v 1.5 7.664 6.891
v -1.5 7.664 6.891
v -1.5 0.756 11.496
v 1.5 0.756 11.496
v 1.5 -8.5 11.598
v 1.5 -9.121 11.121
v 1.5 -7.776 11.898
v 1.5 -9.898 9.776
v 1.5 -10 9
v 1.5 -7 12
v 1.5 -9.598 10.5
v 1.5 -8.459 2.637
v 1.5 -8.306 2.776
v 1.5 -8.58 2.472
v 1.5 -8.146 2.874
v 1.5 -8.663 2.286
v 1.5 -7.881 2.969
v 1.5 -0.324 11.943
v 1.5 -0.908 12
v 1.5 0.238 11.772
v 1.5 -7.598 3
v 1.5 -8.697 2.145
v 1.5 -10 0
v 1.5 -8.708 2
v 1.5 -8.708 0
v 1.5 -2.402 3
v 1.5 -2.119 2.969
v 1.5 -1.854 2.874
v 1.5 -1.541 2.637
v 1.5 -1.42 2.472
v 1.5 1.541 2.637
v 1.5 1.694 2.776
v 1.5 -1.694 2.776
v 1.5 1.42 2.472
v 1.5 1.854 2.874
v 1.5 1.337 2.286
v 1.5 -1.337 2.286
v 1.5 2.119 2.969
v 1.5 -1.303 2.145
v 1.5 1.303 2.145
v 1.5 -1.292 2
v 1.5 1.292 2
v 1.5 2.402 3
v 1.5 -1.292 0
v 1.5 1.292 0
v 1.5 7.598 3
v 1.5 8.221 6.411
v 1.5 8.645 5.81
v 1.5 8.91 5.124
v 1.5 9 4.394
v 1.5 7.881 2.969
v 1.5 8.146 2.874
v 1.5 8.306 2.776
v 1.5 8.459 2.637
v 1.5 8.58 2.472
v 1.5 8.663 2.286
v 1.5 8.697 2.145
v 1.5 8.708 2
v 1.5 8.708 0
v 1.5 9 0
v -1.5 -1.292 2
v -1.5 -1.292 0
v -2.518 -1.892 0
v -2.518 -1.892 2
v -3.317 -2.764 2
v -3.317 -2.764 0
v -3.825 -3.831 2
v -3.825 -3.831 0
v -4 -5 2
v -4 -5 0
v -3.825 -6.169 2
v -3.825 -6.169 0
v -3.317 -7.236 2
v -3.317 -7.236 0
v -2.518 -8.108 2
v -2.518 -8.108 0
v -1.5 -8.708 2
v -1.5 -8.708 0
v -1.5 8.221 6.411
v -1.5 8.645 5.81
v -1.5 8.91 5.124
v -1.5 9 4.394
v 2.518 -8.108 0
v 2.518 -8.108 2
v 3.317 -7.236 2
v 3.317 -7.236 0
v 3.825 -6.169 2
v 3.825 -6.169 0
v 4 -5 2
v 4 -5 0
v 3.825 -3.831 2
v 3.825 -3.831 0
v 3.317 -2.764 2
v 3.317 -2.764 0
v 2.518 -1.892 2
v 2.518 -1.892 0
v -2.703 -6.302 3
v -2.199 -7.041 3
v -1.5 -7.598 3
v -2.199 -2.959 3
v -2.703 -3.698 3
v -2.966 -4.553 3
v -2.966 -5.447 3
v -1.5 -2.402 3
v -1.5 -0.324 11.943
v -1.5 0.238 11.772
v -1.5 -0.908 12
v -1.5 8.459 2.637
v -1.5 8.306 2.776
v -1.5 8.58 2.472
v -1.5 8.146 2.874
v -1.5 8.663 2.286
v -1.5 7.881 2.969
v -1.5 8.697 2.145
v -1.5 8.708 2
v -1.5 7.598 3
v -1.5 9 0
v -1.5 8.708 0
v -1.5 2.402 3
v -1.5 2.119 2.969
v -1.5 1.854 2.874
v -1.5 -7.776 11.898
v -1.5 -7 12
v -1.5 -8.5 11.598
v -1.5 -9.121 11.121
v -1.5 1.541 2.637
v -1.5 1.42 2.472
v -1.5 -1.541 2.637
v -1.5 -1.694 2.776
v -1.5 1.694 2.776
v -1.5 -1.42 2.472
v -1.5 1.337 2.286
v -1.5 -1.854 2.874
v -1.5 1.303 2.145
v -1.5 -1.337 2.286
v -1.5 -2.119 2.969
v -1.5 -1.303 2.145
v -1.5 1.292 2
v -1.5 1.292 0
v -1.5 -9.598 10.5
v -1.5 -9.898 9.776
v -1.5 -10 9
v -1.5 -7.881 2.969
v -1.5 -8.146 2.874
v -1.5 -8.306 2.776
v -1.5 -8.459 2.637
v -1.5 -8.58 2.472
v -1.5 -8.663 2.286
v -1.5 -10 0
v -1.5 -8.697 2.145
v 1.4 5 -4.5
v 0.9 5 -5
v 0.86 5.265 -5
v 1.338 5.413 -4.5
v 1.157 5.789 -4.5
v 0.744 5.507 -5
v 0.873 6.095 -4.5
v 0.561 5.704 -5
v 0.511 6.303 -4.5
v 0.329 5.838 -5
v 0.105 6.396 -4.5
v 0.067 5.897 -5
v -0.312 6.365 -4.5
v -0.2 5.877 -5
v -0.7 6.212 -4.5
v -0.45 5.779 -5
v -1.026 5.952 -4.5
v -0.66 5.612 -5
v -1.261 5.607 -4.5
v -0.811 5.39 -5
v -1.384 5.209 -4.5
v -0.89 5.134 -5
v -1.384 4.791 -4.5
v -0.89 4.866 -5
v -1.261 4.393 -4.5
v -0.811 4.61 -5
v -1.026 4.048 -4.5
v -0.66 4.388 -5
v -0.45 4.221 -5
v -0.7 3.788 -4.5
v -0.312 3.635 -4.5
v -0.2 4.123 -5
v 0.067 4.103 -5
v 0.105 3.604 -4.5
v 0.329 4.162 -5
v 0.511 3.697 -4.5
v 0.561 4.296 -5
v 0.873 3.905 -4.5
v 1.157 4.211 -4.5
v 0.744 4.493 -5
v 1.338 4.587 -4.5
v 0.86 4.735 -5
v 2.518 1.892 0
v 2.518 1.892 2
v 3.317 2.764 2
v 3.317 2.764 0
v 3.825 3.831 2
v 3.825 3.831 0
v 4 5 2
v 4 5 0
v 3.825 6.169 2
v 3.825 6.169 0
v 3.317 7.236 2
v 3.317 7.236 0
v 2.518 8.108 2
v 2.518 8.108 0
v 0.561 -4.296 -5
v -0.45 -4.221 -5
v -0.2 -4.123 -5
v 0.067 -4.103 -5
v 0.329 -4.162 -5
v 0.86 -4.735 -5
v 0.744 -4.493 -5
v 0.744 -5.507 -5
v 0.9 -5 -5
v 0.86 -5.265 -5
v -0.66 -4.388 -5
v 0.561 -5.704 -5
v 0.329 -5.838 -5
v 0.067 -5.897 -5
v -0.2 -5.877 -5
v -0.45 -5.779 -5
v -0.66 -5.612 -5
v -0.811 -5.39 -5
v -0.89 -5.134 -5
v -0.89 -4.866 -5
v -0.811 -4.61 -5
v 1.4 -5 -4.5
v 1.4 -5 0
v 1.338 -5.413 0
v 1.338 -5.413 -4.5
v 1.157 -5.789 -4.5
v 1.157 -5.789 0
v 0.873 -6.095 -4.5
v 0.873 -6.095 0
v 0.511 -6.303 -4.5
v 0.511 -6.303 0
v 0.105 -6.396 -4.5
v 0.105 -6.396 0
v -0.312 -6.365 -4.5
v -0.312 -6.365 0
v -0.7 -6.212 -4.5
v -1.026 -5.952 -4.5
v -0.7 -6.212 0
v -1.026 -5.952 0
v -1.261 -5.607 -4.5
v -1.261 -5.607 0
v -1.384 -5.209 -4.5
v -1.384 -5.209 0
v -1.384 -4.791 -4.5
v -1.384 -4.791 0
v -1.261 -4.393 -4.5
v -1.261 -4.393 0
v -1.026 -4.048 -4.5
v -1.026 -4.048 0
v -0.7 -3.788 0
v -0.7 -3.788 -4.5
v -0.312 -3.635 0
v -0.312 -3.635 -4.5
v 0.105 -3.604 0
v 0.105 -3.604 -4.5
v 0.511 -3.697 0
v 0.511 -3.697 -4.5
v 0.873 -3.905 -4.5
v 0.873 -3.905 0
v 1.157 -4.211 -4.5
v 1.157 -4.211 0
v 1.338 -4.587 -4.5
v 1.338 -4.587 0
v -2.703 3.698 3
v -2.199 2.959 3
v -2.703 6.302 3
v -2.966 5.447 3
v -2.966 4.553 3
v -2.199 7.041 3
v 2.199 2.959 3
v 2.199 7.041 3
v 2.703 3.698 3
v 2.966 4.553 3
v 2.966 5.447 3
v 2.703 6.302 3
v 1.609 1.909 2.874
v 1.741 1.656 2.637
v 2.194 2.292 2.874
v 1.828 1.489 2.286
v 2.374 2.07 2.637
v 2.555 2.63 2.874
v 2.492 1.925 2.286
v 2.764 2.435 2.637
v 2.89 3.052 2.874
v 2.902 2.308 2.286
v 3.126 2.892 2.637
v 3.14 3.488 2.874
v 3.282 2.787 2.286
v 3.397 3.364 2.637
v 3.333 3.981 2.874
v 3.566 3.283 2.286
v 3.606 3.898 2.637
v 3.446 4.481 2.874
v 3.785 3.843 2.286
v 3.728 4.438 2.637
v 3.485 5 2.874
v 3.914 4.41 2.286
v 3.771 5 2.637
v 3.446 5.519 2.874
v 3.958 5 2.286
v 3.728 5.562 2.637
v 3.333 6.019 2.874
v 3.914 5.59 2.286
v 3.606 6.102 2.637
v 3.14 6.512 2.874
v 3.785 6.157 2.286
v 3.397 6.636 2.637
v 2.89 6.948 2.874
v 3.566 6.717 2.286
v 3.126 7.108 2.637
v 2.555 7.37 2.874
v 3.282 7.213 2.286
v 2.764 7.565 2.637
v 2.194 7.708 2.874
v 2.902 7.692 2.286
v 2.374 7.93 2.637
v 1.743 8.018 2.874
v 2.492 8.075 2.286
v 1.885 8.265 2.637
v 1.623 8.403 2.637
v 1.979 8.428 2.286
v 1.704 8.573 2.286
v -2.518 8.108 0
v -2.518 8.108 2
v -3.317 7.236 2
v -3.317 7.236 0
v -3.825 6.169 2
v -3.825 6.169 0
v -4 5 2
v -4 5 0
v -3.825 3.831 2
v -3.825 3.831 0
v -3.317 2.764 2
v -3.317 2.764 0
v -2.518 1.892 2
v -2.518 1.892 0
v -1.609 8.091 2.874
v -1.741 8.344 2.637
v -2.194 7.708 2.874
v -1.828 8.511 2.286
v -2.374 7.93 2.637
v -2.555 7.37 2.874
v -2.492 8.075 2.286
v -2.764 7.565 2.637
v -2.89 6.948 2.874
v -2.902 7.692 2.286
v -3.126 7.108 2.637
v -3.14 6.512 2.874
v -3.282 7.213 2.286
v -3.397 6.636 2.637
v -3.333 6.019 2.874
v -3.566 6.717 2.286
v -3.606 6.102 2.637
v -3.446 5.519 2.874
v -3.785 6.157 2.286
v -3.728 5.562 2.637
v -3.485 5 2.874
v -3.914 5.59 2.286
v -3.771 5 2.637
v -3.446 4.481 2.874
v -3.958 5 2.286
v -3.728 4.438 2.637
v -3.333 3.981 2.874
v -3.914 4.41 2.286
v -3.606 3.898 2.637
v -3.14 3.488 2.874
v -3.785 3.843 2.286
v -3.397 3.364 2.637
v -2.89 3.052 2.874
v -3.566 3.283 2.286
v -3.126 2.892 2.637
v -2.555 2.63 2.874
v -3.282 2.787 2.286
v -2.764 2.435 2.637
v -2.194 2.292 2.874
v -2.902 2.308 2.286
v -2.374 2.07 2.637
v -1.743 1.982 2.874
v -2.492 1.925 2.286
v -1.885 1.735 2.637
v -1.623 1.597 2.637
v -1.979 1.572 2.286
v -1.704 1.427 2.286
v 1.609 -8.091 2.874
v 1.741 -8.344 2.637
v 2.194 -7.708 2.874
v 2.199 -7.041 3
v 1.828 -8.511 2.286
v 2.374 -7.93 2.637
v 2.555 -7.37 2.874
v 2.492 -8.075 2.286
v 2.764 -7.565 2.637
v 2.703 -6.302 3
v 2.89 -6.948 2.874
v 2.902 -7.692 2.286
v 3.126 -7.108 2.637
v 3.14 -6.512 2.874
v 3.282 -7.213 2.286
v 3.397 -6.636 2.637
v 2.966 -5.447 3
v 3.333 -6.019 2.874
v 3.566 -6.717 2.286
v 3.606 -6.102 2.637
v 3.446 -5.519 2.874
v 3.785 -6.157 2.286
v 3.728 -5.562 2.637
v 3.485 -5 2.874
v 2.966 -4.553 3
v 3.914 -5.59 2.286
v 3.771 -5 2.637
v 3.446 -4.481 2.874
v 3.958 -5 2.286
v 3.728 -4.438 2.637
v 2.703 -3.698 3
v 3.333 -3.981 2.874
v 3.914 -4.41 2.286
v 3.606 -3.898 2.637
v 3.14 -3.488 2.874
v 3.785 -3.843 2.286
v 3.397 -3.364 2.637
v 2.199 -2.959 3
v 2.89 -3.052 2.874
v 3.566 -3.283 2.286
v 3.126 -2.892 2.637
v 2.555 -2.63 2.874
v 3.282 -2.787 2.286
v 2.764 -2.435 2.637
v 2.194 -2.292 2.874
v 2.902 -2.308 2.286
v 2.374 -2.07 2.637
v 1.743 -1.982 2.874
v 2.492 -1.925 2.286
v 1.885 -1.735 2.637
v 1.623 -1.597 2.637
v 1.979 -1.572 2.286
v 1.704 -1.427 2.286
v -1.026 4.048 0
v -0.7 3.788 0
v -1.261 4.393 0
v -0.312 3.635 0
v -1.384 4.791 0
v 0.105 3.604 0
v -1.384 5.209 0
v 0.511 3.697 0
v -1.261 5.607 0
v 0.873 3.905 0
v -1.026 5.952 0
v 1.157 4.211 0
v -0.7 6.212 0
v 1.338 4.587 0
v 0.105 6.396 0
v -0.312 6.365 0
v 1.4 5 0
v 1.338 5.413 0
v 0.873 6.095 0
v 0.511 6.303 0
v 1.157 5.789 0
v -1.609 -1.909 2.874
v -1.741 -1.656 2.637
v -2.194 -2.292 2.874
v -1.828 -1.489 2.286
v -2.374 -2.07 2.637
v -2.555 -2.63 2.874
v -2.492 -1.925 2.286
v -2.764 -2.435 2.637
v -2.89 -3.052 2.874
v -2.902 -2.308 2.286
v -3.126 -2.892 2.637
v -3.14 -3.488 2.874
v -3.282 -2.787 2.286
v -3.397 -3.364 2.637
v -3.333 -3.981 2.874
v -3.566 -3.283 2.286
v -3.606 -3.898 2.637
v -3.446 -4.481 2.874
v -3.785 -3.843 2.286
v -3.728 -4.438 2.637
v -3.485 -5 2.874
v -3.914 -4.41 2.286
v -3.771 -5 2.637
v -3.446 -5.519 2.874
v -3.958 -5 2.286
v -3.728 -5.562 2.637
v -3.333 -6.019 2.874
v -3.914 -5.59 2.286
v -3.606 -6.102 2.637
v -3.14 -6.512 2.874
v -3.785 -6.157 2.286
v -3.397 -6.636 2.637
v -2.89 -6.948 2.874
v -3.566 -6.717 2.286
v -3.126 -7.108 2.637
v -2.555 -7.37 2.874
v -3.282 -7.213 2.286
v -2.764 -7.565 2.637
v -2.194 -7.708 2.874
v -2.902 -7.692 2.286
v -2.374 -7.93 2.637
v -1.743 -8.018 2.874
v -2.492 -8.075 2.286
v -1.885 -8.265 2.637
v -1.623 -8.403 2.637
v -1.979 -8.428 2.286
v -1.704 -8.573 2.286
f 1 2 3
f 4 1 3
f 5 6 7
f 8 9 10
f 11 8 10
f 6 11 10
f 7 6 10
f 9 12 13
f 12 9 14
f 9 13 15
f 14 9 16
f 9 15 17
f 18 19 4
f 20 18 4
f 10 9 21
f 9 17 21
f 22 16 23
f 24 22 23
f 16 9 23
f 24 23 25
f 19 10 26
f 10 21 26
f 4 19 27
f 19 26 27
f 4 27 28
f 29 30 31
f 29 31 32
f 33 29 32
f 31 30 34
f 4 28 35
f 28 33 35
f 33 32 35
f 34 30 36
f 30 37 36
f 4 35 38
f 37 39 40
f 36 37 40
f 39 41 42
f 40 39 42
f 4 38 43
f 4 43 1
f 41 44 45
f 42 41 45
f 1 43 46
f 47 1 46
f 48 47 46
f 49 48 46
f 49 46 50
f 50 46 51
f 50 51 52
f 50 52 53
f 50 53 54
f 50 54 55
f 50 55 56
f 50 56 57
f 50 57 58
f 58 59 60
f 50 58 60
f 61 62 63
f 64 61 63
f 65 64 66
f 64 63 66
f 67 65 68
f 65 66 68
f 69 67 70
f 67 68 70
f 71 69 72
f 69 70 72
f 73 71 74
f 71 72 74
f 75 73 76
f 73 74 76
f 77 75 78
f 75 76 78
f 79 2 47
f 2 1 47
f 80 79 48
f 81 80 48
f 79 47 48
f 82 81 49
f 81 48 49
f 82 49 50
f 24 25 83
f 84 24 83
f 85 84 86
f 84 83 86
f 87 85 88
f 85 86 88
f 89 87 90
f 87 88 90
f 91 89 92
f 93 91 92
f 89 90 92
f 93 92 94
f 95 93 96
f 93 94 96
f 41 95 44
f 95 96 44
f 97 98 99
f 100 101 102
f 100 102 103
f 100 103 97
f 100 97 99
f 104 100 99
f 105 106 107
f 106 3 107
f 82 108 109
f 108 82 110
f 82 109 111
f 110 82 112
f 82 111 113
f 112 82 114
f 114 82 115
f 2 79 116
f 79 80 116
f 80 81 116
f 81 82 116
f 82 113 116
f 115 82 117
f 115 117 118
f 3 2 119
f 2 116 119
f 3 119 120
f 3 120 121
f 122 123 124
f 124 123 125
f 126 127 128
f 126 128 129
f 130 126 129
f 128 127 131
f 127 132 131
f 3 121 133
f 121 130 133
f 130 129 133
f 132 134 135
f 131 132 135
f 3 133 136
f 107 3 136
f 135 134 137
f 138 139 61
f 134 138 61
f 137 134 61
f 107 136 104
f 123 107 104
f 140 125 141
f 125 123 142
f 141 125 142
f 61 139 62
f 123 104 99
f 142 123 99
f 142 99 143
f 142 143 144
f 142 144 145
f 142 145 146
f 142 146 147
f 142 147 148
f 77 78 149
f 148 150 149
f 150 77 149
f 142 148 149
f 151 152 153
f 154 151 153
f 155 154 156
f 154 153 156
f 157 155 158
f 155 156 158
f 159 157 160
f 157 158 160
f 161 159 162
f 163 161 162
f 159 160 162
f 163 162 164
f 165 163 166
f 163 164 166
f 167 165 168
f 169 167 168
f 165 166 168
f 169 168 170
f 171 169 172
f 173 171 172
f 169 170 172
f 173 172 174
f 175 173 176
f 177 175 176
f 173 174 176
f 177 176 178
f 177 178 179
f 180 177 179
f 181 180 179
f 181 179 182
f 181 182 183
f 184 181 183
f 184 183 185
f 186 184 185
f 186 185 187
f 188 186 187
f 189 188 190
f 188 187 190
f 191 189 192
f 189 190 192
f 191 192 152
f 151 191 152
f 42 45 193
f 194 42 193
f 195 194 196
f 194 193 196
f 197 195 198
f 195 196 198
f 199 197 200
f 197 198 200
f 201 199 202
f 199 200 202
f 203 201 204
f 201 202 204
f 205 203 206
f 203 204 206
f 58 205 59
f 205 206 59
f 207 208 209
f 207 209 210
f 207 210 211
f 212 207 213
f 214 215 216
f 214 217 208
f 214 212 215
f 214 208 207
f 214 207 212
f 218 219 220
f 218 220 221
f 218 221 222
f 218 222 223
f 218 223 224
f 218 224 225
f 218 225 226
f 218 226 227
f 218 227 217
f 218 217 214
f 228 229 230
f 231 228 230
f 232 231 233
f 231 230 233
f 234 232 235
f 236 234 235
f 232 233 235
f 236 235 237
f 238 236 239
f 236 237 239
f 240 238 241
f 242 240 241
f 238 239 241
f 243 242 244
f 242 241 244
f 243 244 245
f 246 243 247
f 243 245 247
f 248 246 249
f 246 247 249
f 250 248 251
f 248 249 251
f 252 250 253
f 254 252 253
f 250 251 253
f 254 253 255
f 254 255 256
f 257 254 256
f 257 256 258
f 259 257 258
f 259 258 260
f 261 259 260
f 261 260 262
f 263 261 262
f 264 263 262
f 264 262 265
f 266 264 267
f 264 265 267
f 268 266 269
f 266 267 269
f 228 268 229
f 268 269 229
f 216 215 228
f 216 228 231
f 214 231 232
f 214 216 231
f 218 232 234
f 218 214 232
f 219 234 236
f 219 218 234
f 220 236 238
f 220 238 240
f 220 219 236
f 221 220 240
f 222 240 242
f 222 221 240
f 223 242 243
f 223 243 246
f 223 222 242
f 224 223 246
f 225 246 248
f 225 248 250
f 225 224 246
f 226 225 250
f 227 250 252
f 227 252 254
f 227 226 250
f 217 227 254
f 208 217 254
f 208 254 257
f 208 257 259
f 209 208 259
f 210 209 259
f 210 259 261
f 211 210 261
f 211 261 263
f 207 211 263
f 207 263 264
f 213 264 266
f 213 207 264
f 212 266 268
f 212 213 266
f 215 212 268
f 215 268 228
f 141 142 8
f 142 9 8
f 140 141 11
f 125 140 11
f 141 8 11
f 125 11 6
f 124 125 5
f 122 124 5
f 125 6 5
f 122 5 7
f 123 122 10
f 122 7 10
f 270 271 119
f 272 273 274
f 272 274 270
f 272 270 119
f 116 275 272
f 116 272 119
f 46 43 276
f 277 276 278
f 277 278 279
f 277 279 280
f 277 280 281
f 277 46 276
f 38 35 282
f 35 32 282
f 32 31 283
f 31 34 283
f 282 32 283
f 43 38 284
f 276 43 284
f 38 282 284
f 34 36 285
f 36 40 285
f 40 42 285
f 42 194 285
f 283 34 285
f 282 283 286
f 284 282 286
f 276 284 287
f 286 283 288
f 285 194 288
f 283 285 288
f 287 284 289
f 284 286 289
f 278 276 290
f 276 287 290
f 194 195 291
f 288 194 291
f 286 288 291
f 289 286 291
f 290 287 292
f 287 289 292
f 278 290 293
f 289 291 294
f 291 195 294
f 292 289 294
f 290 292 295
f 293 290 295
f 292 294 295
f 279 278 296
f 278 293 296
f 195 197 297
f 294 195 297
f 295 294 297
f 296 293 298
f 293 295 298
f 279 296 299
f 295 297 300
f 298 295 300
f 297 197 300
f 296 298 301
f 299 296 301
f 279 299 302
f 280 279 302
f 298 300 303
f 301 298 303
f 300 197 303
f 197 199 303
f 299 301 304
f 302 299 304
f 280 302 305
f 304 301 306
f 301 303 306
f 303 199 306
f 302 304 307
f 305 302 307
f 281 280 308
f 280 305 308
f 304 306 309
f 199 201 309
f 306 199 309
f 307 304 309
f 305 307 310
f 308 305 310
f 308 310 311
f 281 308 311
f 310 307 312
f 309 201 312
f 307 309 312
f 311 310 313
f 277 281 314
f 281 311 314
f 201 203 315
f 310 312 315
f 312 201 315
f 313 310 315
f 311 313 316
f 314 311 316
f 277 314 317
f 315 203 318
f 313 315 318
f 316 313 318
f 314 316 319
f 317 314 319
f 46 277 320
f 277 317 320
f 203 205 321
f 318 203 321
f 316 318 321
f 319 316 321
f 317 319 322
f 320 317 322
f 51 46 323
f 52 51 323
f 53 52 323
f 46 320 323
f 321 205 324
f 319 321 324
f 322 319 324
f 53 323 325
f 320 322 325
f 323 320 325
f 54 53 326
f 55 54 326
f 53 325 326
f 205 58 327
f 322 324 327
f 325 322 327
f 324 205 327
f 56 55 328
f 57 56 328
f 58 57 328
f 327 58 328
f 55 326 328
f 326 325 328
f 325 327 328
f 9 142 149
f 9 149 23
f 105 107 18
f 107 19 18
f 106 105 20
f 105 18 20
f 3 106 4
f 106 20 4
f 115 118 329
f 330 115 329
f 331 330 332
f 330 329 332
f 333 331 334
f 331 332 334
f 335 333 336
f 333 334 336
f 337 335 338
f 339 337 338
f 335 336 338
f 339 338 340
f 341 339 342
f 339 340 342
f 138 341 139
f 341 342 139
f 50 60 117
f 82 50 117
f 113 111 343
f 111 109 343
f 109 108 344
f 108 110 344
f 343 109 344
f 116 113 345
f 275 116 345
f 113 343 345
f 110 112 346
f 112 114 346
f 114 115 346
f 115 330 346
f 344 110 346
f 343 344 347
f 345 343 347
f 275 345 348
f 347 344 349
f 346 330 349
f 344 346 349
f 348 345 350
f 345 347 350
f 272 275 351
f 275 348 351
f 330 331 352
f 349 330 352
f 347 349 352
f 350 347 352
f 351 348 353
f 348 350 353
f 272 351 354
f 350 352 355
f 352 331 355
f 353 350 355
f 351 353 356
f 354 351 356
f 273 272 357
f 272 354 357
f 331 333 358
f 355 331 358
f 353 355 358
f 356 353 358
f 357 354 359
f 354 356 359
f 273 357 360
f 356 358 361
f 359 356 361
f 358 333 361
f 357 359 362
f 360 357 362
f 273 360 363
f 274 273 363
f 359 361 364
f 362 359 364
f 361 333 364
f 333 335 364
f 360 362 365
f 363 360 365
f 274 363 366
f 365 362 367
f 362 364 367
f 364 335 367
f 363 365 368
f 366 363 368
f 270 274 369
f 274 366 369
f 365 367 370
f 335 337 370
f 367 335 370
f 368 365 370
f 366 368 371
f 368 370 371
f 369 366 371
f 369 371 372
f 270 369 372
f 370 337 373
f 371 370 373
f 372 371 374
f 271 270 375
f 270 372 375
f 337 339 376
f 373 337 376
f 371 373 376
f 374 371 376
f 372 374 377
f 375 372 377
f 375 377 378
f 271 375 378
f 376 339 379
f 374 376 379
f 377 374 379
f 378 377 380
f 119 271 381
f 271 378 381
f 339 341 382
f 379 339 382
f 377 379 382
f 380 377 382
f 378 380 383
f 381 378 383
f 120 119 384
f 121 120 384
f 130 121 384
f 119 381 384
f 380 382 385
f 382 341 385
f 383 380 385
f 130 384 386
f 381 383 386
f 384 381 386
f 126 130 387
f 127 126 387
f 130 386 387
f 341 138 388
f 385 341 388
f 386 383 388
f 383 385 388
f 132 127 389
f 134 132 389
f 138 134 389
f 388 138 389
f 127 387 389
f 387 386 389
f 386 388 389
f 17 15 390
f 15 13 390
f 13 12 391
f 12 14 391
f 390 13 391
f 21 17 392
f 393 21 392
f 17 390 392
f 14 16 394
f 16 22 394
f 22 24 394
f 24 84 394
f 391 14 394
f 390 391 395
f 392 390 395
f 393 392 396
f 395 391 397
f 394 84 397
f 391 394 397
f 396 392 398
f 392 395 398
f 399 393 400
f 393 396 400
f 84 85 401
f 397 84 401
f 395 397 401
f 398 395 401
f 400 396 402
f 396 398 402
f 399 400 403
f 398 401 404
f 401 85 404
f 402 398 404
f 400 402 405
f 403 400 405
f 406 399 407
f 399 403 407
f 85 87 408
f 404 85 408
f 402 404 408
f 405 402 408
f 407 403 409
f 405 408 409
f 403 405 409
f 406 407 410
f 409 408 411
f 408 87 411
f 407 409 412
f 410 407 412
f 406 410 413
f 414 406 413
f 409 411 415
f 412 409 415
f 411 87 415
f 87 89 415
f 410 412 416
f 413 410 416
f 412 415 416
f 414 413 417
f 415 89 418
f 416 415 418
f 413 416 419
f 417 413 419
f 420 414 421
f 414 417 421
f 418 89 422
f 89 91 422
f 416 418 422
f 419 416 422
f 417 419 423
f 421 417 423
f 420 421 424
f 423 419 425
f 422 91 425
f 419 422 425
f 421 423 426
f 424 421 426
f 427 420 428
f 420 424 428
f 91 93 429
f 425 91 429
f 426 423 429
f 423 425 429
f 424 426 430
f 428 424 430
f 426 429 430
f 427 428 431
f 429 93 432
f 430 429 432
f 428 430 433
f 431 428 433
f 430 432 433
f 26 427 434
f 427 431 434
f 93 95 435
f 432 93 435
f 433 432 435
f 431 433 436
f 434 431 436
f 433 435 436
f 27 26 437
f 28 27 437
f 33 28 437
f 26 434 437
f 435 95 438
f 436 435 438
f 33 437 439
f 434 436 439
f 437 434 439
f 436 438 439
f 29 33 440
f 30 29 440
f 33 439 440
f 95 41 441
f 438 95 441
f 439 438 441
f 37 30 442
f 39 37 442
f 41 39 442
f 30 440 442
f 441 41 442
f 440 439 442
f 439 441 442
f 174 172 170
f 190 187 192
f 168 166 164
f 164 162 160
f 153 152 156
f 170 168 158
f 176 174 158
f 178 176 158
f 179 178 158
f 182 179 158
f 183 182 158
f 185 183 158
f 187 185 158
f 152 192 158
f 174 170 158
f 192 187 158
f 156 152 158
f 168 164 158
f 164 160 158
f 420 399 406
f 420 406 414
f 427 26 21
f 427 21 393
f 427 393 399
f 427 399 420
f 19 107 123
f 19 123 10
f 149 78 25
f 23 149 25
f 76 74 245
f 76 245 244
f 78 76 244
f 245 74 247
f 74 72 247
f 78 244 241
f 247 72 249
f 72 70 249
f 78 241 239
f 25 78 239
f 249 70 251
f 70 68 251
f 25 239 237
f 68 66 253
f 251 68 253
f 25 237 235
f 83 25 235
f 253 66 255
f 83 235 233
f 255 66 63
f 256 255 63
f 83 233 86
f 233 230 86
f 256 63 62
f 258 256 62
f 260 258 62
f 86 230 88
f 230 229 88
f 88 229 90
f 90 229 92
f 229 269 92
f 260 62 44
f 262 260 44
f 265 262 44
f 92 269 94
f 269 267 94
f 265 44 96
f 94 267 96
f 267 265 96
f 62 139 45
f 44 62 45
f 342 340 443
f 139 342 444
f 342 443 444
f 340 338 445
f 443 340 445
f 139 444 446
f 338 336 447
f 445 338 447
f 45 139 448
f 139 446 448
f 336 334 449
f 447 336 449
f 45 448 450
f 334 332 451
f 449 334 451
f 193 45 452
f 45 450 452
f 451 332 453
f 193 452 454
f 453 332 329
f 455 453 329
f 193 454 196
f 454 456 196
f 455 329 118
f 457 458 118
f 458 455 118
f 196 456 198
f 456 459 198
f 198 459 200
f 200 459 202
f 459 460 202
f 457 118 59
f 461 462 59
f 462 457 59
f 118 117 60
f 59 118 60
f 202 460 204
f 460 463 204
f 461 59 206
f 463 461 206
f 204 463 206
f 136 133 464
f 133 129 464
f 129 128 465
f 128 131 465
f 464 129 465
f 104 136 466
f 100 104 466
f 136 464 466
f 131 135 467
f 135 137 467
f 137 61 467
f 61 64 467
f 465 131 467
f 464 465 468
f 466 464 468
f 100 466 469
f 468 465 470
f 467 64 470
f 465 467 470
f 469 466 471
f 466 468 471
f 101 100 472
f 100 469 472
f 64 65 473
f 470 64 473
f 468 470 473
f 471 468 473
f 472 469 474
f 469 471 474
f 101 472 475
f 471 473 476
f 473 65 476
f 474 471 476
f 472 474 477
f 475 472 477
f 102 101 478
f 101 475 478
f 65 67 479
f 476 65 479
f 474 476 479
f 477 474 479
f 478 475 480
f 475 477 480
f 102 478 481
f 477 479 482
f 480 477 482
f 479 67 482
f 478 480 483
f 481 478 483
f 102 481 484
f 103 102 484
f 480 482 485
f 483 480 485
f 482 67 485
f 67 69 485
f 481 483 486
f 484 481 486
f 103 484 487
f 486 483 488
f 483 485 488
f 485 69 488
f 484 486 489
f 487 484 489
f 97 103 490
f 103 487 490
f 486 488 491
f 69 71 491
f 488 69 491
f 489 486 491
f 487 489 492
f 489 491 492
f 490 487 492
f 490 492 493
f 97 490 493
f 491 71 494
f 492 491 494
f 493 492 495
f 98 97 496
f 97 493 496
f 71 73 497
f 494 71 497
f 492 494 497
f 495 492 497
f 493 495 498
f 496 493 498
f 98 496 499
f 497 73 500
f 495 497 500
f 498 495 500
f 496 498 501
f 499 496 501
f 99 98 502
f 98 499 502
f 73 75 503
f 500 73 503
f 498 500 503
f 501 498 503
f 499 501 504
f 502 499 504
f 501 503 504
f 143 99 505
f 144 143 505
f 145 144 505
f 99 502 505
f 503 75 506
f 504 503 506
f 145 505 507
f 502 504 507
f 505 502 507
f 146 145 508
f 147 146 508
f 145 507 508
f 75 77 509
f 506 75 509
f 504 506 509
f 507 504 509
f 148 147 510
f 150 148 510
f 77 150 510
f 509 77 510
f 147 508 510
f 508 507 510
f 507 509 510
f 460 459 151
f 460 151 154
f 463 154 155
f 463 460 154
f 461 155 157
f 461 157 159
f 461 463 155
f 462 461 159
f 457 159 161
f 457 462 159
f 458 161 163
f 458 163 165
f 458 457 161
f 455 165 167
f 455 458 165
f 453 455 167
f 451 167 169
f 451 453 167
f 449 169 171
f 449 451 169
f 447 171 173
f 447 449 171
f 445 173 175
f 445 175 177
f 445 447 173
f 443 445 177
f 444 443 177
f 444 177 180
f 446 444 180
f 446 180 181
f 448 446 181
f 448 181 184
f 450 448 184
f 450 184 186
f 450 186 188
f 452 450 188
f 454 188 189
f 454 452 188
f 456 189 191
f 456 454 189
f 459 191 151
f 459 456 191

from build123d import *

# Parameters (mm, degrees)
F0_R     = 1.4
F1_DEPTH = 12
F2_DEPTH = 5
F3_SIZE  = 0.5
F4_DEPTH = 3
F5_R     = 1
F7_DEPTH = 25
F8_R     = 3


# Not quite as in the source:
# - a pattern or mirror of a feature is missing from the dataset's text; its kind, count and spacing are read off the source's solid
# - a feature names something its author has since deleted; it is built from what else it names


with BuildPart() as f1:
    # F0 (on Top) → F1 (new body)
    with BuildSketch(Plane.XY):
        with BuildLine():
            ThreePointArc((1.5, 8.7080992435), (0.7640690498, 8.92634671), (0, 9))
            ThreePointArc((0, 9), (-0.7640690498, 8.92634671), (-1.5, 8.7080992435))
            Line((-1.5, 8.7080992435), (-1.5, 1.2919007565))
            Line((-1.5, 1.2919007565), (-1.5, -1.2919007565))
            Line((-1.5, -1.2919007565), (-1.5, -8.7080992435))
            Line((-1.5, -8.7080992435), (-1.5, -10))
            Line((-1.5, -10), (1.5, -10))
            Line((1.5, -10), (1.5, -8.7080992435))
            Line((1.5, -8.7080992435), (1.5, -1.2919007565))
            Line((1.5, -1.2919007565), (1.5, 1.2919007565))
            Line((1.5, 1.2919007565), (1.5, 8.7080992435))
        make_face()
        with Locations((0, -5)):
            Circle(F0_R, mode=Mode.SUBTRACT)
        with Locations((0, 5)):
            Circle(F0_R, mode=Mode.SUBTRACT)
        with Locations((0, 5)):
            Circle(F0_R)
        with Locations((0, -5)):
            Circle(F0_R)
        with BuildLine():
            Line((0, 9), (-1.5, 9))
            Line((-1.5, 9), (-1.5, 8.7080992435))
            ThreePointArc((-1.5, 8.7080992435), (-0.7640690498, 8.92634671), (0, 9))
        make_face()
        with BuildLine():
            Line((1.5, 9), (0, 9))
            ThreePointArc((0, 9), (0.7640690498, 8.92634671), (1.5, 8.7080992435))
            Line((1.5, 8.7080992435), (1.5, 9))
        make_face()
    extrude(amount=F1_DEPTH)

    # F0 (on Top) → F2 (join)
    with BuildSketch(Plane.XY):
        with Locations((0, 5)):
            Circle(F0_R)
    f2 = extrude(amount=-F2_DEPTH)

    # F2_copies: F2 across plane
    add(f2.mirror(Plane(origin=(0, 0, 0), x_dir=(0, 0, -1), z_dir=(0, -1, 0))))

    # F3
    f3_edges = [f1.edges().sort_by_distance(p)[0] for p in [
        (-1.4, -5, -5),
        (-1.4, 5, -5),
    ]]
    chamfer(f3_edges, length=F3_SIZE)

    # F0 (on Top) → F4 (join)
    with BuildSketch(Plane.XY):
        with Locations((0, 5)):
            Circle(F0_R)
        with Locations((0, -5)):
            Circle(F0_R)
        with BuildLine():
            Line((0, 9), (-1.5, 9))
            Line((-1.5, 9), (-1.5, 8.7080992435))
            ThreePointArc((-1.5, 8.7080992435), (-0.7640690498, 8.92634671), (0, 9))
        make_face()
        with BuildLine():
            Line((1.5, 9), (0, 9))
            ThreePointArc((0, 9), (0.7640690498, 8.92634671), (1.5, 8.7080992435))
            Line((1.5, 8.7080992435), (1.5, 9))
        make_face()
        with BuildLine():
            Line((-1.5, 1.2919007565), (-1.5, 8.7080992435))
            ThreePointArc((-1.5, 8.7080992435), (-4, 5), (-1.5, 1.2919007565))
        make_face()
        with BuildLine():
            ThreePointArc((1.5, 1.2919007565), (4, 5), (1.5, 8.7080992435))
            Line((1.5, 8.7080992435), (1.5, 1.2919007565))
        make_face()
        with BuildLine():
            Line((-1.5, -8.7080992435), (-1.5, -1.2919007565))
            ThreePointArc((-1.5, -1.2919007565), (-4, -5), (-1.5, -8.7080992435))
        make_face()
        with BuildLine():
            ThreePointArc((1.5, -8.7080992435), (4, -5), (1.5, -1.2919007565))
            Line((1.5, -1.2919007565), (1.5, -8.7080992435))
        make_face()
    extrude(amount=F4_DEPTH)

    # F5
    f5_edges = [f1.edges().sort_by_distance(p)[0] for p in [
        (-4, -5, 3),
        (4, -5, 3),
        (-4, 5, 3),
        (4, 5, 3),
    ]]
    fillet(f5_edges, radius=F5_R)

    # F6 (on face) → F7 (cut)
    with BuildSketch(Plane(origin=(-1.5, 0, 0), x_dir=(0, -1, 0), z_dir=(-1, 0, 0))):
        Polygon((0, 12), (-9, 12), (-9, 6), align=None)
    extrude(amount=-F7_DEPTH, mode=Mode.SUBTRACT)

    # F8
    f8_edges = [f1.edges().sort_by_distance(p)[0] for p in [
        (0, -10, 12),
        (0, 0, 12),
        (0, 9, 6),
    ]]
    fillet(f8_edges, radius=F8_R)


solid = f1.part
